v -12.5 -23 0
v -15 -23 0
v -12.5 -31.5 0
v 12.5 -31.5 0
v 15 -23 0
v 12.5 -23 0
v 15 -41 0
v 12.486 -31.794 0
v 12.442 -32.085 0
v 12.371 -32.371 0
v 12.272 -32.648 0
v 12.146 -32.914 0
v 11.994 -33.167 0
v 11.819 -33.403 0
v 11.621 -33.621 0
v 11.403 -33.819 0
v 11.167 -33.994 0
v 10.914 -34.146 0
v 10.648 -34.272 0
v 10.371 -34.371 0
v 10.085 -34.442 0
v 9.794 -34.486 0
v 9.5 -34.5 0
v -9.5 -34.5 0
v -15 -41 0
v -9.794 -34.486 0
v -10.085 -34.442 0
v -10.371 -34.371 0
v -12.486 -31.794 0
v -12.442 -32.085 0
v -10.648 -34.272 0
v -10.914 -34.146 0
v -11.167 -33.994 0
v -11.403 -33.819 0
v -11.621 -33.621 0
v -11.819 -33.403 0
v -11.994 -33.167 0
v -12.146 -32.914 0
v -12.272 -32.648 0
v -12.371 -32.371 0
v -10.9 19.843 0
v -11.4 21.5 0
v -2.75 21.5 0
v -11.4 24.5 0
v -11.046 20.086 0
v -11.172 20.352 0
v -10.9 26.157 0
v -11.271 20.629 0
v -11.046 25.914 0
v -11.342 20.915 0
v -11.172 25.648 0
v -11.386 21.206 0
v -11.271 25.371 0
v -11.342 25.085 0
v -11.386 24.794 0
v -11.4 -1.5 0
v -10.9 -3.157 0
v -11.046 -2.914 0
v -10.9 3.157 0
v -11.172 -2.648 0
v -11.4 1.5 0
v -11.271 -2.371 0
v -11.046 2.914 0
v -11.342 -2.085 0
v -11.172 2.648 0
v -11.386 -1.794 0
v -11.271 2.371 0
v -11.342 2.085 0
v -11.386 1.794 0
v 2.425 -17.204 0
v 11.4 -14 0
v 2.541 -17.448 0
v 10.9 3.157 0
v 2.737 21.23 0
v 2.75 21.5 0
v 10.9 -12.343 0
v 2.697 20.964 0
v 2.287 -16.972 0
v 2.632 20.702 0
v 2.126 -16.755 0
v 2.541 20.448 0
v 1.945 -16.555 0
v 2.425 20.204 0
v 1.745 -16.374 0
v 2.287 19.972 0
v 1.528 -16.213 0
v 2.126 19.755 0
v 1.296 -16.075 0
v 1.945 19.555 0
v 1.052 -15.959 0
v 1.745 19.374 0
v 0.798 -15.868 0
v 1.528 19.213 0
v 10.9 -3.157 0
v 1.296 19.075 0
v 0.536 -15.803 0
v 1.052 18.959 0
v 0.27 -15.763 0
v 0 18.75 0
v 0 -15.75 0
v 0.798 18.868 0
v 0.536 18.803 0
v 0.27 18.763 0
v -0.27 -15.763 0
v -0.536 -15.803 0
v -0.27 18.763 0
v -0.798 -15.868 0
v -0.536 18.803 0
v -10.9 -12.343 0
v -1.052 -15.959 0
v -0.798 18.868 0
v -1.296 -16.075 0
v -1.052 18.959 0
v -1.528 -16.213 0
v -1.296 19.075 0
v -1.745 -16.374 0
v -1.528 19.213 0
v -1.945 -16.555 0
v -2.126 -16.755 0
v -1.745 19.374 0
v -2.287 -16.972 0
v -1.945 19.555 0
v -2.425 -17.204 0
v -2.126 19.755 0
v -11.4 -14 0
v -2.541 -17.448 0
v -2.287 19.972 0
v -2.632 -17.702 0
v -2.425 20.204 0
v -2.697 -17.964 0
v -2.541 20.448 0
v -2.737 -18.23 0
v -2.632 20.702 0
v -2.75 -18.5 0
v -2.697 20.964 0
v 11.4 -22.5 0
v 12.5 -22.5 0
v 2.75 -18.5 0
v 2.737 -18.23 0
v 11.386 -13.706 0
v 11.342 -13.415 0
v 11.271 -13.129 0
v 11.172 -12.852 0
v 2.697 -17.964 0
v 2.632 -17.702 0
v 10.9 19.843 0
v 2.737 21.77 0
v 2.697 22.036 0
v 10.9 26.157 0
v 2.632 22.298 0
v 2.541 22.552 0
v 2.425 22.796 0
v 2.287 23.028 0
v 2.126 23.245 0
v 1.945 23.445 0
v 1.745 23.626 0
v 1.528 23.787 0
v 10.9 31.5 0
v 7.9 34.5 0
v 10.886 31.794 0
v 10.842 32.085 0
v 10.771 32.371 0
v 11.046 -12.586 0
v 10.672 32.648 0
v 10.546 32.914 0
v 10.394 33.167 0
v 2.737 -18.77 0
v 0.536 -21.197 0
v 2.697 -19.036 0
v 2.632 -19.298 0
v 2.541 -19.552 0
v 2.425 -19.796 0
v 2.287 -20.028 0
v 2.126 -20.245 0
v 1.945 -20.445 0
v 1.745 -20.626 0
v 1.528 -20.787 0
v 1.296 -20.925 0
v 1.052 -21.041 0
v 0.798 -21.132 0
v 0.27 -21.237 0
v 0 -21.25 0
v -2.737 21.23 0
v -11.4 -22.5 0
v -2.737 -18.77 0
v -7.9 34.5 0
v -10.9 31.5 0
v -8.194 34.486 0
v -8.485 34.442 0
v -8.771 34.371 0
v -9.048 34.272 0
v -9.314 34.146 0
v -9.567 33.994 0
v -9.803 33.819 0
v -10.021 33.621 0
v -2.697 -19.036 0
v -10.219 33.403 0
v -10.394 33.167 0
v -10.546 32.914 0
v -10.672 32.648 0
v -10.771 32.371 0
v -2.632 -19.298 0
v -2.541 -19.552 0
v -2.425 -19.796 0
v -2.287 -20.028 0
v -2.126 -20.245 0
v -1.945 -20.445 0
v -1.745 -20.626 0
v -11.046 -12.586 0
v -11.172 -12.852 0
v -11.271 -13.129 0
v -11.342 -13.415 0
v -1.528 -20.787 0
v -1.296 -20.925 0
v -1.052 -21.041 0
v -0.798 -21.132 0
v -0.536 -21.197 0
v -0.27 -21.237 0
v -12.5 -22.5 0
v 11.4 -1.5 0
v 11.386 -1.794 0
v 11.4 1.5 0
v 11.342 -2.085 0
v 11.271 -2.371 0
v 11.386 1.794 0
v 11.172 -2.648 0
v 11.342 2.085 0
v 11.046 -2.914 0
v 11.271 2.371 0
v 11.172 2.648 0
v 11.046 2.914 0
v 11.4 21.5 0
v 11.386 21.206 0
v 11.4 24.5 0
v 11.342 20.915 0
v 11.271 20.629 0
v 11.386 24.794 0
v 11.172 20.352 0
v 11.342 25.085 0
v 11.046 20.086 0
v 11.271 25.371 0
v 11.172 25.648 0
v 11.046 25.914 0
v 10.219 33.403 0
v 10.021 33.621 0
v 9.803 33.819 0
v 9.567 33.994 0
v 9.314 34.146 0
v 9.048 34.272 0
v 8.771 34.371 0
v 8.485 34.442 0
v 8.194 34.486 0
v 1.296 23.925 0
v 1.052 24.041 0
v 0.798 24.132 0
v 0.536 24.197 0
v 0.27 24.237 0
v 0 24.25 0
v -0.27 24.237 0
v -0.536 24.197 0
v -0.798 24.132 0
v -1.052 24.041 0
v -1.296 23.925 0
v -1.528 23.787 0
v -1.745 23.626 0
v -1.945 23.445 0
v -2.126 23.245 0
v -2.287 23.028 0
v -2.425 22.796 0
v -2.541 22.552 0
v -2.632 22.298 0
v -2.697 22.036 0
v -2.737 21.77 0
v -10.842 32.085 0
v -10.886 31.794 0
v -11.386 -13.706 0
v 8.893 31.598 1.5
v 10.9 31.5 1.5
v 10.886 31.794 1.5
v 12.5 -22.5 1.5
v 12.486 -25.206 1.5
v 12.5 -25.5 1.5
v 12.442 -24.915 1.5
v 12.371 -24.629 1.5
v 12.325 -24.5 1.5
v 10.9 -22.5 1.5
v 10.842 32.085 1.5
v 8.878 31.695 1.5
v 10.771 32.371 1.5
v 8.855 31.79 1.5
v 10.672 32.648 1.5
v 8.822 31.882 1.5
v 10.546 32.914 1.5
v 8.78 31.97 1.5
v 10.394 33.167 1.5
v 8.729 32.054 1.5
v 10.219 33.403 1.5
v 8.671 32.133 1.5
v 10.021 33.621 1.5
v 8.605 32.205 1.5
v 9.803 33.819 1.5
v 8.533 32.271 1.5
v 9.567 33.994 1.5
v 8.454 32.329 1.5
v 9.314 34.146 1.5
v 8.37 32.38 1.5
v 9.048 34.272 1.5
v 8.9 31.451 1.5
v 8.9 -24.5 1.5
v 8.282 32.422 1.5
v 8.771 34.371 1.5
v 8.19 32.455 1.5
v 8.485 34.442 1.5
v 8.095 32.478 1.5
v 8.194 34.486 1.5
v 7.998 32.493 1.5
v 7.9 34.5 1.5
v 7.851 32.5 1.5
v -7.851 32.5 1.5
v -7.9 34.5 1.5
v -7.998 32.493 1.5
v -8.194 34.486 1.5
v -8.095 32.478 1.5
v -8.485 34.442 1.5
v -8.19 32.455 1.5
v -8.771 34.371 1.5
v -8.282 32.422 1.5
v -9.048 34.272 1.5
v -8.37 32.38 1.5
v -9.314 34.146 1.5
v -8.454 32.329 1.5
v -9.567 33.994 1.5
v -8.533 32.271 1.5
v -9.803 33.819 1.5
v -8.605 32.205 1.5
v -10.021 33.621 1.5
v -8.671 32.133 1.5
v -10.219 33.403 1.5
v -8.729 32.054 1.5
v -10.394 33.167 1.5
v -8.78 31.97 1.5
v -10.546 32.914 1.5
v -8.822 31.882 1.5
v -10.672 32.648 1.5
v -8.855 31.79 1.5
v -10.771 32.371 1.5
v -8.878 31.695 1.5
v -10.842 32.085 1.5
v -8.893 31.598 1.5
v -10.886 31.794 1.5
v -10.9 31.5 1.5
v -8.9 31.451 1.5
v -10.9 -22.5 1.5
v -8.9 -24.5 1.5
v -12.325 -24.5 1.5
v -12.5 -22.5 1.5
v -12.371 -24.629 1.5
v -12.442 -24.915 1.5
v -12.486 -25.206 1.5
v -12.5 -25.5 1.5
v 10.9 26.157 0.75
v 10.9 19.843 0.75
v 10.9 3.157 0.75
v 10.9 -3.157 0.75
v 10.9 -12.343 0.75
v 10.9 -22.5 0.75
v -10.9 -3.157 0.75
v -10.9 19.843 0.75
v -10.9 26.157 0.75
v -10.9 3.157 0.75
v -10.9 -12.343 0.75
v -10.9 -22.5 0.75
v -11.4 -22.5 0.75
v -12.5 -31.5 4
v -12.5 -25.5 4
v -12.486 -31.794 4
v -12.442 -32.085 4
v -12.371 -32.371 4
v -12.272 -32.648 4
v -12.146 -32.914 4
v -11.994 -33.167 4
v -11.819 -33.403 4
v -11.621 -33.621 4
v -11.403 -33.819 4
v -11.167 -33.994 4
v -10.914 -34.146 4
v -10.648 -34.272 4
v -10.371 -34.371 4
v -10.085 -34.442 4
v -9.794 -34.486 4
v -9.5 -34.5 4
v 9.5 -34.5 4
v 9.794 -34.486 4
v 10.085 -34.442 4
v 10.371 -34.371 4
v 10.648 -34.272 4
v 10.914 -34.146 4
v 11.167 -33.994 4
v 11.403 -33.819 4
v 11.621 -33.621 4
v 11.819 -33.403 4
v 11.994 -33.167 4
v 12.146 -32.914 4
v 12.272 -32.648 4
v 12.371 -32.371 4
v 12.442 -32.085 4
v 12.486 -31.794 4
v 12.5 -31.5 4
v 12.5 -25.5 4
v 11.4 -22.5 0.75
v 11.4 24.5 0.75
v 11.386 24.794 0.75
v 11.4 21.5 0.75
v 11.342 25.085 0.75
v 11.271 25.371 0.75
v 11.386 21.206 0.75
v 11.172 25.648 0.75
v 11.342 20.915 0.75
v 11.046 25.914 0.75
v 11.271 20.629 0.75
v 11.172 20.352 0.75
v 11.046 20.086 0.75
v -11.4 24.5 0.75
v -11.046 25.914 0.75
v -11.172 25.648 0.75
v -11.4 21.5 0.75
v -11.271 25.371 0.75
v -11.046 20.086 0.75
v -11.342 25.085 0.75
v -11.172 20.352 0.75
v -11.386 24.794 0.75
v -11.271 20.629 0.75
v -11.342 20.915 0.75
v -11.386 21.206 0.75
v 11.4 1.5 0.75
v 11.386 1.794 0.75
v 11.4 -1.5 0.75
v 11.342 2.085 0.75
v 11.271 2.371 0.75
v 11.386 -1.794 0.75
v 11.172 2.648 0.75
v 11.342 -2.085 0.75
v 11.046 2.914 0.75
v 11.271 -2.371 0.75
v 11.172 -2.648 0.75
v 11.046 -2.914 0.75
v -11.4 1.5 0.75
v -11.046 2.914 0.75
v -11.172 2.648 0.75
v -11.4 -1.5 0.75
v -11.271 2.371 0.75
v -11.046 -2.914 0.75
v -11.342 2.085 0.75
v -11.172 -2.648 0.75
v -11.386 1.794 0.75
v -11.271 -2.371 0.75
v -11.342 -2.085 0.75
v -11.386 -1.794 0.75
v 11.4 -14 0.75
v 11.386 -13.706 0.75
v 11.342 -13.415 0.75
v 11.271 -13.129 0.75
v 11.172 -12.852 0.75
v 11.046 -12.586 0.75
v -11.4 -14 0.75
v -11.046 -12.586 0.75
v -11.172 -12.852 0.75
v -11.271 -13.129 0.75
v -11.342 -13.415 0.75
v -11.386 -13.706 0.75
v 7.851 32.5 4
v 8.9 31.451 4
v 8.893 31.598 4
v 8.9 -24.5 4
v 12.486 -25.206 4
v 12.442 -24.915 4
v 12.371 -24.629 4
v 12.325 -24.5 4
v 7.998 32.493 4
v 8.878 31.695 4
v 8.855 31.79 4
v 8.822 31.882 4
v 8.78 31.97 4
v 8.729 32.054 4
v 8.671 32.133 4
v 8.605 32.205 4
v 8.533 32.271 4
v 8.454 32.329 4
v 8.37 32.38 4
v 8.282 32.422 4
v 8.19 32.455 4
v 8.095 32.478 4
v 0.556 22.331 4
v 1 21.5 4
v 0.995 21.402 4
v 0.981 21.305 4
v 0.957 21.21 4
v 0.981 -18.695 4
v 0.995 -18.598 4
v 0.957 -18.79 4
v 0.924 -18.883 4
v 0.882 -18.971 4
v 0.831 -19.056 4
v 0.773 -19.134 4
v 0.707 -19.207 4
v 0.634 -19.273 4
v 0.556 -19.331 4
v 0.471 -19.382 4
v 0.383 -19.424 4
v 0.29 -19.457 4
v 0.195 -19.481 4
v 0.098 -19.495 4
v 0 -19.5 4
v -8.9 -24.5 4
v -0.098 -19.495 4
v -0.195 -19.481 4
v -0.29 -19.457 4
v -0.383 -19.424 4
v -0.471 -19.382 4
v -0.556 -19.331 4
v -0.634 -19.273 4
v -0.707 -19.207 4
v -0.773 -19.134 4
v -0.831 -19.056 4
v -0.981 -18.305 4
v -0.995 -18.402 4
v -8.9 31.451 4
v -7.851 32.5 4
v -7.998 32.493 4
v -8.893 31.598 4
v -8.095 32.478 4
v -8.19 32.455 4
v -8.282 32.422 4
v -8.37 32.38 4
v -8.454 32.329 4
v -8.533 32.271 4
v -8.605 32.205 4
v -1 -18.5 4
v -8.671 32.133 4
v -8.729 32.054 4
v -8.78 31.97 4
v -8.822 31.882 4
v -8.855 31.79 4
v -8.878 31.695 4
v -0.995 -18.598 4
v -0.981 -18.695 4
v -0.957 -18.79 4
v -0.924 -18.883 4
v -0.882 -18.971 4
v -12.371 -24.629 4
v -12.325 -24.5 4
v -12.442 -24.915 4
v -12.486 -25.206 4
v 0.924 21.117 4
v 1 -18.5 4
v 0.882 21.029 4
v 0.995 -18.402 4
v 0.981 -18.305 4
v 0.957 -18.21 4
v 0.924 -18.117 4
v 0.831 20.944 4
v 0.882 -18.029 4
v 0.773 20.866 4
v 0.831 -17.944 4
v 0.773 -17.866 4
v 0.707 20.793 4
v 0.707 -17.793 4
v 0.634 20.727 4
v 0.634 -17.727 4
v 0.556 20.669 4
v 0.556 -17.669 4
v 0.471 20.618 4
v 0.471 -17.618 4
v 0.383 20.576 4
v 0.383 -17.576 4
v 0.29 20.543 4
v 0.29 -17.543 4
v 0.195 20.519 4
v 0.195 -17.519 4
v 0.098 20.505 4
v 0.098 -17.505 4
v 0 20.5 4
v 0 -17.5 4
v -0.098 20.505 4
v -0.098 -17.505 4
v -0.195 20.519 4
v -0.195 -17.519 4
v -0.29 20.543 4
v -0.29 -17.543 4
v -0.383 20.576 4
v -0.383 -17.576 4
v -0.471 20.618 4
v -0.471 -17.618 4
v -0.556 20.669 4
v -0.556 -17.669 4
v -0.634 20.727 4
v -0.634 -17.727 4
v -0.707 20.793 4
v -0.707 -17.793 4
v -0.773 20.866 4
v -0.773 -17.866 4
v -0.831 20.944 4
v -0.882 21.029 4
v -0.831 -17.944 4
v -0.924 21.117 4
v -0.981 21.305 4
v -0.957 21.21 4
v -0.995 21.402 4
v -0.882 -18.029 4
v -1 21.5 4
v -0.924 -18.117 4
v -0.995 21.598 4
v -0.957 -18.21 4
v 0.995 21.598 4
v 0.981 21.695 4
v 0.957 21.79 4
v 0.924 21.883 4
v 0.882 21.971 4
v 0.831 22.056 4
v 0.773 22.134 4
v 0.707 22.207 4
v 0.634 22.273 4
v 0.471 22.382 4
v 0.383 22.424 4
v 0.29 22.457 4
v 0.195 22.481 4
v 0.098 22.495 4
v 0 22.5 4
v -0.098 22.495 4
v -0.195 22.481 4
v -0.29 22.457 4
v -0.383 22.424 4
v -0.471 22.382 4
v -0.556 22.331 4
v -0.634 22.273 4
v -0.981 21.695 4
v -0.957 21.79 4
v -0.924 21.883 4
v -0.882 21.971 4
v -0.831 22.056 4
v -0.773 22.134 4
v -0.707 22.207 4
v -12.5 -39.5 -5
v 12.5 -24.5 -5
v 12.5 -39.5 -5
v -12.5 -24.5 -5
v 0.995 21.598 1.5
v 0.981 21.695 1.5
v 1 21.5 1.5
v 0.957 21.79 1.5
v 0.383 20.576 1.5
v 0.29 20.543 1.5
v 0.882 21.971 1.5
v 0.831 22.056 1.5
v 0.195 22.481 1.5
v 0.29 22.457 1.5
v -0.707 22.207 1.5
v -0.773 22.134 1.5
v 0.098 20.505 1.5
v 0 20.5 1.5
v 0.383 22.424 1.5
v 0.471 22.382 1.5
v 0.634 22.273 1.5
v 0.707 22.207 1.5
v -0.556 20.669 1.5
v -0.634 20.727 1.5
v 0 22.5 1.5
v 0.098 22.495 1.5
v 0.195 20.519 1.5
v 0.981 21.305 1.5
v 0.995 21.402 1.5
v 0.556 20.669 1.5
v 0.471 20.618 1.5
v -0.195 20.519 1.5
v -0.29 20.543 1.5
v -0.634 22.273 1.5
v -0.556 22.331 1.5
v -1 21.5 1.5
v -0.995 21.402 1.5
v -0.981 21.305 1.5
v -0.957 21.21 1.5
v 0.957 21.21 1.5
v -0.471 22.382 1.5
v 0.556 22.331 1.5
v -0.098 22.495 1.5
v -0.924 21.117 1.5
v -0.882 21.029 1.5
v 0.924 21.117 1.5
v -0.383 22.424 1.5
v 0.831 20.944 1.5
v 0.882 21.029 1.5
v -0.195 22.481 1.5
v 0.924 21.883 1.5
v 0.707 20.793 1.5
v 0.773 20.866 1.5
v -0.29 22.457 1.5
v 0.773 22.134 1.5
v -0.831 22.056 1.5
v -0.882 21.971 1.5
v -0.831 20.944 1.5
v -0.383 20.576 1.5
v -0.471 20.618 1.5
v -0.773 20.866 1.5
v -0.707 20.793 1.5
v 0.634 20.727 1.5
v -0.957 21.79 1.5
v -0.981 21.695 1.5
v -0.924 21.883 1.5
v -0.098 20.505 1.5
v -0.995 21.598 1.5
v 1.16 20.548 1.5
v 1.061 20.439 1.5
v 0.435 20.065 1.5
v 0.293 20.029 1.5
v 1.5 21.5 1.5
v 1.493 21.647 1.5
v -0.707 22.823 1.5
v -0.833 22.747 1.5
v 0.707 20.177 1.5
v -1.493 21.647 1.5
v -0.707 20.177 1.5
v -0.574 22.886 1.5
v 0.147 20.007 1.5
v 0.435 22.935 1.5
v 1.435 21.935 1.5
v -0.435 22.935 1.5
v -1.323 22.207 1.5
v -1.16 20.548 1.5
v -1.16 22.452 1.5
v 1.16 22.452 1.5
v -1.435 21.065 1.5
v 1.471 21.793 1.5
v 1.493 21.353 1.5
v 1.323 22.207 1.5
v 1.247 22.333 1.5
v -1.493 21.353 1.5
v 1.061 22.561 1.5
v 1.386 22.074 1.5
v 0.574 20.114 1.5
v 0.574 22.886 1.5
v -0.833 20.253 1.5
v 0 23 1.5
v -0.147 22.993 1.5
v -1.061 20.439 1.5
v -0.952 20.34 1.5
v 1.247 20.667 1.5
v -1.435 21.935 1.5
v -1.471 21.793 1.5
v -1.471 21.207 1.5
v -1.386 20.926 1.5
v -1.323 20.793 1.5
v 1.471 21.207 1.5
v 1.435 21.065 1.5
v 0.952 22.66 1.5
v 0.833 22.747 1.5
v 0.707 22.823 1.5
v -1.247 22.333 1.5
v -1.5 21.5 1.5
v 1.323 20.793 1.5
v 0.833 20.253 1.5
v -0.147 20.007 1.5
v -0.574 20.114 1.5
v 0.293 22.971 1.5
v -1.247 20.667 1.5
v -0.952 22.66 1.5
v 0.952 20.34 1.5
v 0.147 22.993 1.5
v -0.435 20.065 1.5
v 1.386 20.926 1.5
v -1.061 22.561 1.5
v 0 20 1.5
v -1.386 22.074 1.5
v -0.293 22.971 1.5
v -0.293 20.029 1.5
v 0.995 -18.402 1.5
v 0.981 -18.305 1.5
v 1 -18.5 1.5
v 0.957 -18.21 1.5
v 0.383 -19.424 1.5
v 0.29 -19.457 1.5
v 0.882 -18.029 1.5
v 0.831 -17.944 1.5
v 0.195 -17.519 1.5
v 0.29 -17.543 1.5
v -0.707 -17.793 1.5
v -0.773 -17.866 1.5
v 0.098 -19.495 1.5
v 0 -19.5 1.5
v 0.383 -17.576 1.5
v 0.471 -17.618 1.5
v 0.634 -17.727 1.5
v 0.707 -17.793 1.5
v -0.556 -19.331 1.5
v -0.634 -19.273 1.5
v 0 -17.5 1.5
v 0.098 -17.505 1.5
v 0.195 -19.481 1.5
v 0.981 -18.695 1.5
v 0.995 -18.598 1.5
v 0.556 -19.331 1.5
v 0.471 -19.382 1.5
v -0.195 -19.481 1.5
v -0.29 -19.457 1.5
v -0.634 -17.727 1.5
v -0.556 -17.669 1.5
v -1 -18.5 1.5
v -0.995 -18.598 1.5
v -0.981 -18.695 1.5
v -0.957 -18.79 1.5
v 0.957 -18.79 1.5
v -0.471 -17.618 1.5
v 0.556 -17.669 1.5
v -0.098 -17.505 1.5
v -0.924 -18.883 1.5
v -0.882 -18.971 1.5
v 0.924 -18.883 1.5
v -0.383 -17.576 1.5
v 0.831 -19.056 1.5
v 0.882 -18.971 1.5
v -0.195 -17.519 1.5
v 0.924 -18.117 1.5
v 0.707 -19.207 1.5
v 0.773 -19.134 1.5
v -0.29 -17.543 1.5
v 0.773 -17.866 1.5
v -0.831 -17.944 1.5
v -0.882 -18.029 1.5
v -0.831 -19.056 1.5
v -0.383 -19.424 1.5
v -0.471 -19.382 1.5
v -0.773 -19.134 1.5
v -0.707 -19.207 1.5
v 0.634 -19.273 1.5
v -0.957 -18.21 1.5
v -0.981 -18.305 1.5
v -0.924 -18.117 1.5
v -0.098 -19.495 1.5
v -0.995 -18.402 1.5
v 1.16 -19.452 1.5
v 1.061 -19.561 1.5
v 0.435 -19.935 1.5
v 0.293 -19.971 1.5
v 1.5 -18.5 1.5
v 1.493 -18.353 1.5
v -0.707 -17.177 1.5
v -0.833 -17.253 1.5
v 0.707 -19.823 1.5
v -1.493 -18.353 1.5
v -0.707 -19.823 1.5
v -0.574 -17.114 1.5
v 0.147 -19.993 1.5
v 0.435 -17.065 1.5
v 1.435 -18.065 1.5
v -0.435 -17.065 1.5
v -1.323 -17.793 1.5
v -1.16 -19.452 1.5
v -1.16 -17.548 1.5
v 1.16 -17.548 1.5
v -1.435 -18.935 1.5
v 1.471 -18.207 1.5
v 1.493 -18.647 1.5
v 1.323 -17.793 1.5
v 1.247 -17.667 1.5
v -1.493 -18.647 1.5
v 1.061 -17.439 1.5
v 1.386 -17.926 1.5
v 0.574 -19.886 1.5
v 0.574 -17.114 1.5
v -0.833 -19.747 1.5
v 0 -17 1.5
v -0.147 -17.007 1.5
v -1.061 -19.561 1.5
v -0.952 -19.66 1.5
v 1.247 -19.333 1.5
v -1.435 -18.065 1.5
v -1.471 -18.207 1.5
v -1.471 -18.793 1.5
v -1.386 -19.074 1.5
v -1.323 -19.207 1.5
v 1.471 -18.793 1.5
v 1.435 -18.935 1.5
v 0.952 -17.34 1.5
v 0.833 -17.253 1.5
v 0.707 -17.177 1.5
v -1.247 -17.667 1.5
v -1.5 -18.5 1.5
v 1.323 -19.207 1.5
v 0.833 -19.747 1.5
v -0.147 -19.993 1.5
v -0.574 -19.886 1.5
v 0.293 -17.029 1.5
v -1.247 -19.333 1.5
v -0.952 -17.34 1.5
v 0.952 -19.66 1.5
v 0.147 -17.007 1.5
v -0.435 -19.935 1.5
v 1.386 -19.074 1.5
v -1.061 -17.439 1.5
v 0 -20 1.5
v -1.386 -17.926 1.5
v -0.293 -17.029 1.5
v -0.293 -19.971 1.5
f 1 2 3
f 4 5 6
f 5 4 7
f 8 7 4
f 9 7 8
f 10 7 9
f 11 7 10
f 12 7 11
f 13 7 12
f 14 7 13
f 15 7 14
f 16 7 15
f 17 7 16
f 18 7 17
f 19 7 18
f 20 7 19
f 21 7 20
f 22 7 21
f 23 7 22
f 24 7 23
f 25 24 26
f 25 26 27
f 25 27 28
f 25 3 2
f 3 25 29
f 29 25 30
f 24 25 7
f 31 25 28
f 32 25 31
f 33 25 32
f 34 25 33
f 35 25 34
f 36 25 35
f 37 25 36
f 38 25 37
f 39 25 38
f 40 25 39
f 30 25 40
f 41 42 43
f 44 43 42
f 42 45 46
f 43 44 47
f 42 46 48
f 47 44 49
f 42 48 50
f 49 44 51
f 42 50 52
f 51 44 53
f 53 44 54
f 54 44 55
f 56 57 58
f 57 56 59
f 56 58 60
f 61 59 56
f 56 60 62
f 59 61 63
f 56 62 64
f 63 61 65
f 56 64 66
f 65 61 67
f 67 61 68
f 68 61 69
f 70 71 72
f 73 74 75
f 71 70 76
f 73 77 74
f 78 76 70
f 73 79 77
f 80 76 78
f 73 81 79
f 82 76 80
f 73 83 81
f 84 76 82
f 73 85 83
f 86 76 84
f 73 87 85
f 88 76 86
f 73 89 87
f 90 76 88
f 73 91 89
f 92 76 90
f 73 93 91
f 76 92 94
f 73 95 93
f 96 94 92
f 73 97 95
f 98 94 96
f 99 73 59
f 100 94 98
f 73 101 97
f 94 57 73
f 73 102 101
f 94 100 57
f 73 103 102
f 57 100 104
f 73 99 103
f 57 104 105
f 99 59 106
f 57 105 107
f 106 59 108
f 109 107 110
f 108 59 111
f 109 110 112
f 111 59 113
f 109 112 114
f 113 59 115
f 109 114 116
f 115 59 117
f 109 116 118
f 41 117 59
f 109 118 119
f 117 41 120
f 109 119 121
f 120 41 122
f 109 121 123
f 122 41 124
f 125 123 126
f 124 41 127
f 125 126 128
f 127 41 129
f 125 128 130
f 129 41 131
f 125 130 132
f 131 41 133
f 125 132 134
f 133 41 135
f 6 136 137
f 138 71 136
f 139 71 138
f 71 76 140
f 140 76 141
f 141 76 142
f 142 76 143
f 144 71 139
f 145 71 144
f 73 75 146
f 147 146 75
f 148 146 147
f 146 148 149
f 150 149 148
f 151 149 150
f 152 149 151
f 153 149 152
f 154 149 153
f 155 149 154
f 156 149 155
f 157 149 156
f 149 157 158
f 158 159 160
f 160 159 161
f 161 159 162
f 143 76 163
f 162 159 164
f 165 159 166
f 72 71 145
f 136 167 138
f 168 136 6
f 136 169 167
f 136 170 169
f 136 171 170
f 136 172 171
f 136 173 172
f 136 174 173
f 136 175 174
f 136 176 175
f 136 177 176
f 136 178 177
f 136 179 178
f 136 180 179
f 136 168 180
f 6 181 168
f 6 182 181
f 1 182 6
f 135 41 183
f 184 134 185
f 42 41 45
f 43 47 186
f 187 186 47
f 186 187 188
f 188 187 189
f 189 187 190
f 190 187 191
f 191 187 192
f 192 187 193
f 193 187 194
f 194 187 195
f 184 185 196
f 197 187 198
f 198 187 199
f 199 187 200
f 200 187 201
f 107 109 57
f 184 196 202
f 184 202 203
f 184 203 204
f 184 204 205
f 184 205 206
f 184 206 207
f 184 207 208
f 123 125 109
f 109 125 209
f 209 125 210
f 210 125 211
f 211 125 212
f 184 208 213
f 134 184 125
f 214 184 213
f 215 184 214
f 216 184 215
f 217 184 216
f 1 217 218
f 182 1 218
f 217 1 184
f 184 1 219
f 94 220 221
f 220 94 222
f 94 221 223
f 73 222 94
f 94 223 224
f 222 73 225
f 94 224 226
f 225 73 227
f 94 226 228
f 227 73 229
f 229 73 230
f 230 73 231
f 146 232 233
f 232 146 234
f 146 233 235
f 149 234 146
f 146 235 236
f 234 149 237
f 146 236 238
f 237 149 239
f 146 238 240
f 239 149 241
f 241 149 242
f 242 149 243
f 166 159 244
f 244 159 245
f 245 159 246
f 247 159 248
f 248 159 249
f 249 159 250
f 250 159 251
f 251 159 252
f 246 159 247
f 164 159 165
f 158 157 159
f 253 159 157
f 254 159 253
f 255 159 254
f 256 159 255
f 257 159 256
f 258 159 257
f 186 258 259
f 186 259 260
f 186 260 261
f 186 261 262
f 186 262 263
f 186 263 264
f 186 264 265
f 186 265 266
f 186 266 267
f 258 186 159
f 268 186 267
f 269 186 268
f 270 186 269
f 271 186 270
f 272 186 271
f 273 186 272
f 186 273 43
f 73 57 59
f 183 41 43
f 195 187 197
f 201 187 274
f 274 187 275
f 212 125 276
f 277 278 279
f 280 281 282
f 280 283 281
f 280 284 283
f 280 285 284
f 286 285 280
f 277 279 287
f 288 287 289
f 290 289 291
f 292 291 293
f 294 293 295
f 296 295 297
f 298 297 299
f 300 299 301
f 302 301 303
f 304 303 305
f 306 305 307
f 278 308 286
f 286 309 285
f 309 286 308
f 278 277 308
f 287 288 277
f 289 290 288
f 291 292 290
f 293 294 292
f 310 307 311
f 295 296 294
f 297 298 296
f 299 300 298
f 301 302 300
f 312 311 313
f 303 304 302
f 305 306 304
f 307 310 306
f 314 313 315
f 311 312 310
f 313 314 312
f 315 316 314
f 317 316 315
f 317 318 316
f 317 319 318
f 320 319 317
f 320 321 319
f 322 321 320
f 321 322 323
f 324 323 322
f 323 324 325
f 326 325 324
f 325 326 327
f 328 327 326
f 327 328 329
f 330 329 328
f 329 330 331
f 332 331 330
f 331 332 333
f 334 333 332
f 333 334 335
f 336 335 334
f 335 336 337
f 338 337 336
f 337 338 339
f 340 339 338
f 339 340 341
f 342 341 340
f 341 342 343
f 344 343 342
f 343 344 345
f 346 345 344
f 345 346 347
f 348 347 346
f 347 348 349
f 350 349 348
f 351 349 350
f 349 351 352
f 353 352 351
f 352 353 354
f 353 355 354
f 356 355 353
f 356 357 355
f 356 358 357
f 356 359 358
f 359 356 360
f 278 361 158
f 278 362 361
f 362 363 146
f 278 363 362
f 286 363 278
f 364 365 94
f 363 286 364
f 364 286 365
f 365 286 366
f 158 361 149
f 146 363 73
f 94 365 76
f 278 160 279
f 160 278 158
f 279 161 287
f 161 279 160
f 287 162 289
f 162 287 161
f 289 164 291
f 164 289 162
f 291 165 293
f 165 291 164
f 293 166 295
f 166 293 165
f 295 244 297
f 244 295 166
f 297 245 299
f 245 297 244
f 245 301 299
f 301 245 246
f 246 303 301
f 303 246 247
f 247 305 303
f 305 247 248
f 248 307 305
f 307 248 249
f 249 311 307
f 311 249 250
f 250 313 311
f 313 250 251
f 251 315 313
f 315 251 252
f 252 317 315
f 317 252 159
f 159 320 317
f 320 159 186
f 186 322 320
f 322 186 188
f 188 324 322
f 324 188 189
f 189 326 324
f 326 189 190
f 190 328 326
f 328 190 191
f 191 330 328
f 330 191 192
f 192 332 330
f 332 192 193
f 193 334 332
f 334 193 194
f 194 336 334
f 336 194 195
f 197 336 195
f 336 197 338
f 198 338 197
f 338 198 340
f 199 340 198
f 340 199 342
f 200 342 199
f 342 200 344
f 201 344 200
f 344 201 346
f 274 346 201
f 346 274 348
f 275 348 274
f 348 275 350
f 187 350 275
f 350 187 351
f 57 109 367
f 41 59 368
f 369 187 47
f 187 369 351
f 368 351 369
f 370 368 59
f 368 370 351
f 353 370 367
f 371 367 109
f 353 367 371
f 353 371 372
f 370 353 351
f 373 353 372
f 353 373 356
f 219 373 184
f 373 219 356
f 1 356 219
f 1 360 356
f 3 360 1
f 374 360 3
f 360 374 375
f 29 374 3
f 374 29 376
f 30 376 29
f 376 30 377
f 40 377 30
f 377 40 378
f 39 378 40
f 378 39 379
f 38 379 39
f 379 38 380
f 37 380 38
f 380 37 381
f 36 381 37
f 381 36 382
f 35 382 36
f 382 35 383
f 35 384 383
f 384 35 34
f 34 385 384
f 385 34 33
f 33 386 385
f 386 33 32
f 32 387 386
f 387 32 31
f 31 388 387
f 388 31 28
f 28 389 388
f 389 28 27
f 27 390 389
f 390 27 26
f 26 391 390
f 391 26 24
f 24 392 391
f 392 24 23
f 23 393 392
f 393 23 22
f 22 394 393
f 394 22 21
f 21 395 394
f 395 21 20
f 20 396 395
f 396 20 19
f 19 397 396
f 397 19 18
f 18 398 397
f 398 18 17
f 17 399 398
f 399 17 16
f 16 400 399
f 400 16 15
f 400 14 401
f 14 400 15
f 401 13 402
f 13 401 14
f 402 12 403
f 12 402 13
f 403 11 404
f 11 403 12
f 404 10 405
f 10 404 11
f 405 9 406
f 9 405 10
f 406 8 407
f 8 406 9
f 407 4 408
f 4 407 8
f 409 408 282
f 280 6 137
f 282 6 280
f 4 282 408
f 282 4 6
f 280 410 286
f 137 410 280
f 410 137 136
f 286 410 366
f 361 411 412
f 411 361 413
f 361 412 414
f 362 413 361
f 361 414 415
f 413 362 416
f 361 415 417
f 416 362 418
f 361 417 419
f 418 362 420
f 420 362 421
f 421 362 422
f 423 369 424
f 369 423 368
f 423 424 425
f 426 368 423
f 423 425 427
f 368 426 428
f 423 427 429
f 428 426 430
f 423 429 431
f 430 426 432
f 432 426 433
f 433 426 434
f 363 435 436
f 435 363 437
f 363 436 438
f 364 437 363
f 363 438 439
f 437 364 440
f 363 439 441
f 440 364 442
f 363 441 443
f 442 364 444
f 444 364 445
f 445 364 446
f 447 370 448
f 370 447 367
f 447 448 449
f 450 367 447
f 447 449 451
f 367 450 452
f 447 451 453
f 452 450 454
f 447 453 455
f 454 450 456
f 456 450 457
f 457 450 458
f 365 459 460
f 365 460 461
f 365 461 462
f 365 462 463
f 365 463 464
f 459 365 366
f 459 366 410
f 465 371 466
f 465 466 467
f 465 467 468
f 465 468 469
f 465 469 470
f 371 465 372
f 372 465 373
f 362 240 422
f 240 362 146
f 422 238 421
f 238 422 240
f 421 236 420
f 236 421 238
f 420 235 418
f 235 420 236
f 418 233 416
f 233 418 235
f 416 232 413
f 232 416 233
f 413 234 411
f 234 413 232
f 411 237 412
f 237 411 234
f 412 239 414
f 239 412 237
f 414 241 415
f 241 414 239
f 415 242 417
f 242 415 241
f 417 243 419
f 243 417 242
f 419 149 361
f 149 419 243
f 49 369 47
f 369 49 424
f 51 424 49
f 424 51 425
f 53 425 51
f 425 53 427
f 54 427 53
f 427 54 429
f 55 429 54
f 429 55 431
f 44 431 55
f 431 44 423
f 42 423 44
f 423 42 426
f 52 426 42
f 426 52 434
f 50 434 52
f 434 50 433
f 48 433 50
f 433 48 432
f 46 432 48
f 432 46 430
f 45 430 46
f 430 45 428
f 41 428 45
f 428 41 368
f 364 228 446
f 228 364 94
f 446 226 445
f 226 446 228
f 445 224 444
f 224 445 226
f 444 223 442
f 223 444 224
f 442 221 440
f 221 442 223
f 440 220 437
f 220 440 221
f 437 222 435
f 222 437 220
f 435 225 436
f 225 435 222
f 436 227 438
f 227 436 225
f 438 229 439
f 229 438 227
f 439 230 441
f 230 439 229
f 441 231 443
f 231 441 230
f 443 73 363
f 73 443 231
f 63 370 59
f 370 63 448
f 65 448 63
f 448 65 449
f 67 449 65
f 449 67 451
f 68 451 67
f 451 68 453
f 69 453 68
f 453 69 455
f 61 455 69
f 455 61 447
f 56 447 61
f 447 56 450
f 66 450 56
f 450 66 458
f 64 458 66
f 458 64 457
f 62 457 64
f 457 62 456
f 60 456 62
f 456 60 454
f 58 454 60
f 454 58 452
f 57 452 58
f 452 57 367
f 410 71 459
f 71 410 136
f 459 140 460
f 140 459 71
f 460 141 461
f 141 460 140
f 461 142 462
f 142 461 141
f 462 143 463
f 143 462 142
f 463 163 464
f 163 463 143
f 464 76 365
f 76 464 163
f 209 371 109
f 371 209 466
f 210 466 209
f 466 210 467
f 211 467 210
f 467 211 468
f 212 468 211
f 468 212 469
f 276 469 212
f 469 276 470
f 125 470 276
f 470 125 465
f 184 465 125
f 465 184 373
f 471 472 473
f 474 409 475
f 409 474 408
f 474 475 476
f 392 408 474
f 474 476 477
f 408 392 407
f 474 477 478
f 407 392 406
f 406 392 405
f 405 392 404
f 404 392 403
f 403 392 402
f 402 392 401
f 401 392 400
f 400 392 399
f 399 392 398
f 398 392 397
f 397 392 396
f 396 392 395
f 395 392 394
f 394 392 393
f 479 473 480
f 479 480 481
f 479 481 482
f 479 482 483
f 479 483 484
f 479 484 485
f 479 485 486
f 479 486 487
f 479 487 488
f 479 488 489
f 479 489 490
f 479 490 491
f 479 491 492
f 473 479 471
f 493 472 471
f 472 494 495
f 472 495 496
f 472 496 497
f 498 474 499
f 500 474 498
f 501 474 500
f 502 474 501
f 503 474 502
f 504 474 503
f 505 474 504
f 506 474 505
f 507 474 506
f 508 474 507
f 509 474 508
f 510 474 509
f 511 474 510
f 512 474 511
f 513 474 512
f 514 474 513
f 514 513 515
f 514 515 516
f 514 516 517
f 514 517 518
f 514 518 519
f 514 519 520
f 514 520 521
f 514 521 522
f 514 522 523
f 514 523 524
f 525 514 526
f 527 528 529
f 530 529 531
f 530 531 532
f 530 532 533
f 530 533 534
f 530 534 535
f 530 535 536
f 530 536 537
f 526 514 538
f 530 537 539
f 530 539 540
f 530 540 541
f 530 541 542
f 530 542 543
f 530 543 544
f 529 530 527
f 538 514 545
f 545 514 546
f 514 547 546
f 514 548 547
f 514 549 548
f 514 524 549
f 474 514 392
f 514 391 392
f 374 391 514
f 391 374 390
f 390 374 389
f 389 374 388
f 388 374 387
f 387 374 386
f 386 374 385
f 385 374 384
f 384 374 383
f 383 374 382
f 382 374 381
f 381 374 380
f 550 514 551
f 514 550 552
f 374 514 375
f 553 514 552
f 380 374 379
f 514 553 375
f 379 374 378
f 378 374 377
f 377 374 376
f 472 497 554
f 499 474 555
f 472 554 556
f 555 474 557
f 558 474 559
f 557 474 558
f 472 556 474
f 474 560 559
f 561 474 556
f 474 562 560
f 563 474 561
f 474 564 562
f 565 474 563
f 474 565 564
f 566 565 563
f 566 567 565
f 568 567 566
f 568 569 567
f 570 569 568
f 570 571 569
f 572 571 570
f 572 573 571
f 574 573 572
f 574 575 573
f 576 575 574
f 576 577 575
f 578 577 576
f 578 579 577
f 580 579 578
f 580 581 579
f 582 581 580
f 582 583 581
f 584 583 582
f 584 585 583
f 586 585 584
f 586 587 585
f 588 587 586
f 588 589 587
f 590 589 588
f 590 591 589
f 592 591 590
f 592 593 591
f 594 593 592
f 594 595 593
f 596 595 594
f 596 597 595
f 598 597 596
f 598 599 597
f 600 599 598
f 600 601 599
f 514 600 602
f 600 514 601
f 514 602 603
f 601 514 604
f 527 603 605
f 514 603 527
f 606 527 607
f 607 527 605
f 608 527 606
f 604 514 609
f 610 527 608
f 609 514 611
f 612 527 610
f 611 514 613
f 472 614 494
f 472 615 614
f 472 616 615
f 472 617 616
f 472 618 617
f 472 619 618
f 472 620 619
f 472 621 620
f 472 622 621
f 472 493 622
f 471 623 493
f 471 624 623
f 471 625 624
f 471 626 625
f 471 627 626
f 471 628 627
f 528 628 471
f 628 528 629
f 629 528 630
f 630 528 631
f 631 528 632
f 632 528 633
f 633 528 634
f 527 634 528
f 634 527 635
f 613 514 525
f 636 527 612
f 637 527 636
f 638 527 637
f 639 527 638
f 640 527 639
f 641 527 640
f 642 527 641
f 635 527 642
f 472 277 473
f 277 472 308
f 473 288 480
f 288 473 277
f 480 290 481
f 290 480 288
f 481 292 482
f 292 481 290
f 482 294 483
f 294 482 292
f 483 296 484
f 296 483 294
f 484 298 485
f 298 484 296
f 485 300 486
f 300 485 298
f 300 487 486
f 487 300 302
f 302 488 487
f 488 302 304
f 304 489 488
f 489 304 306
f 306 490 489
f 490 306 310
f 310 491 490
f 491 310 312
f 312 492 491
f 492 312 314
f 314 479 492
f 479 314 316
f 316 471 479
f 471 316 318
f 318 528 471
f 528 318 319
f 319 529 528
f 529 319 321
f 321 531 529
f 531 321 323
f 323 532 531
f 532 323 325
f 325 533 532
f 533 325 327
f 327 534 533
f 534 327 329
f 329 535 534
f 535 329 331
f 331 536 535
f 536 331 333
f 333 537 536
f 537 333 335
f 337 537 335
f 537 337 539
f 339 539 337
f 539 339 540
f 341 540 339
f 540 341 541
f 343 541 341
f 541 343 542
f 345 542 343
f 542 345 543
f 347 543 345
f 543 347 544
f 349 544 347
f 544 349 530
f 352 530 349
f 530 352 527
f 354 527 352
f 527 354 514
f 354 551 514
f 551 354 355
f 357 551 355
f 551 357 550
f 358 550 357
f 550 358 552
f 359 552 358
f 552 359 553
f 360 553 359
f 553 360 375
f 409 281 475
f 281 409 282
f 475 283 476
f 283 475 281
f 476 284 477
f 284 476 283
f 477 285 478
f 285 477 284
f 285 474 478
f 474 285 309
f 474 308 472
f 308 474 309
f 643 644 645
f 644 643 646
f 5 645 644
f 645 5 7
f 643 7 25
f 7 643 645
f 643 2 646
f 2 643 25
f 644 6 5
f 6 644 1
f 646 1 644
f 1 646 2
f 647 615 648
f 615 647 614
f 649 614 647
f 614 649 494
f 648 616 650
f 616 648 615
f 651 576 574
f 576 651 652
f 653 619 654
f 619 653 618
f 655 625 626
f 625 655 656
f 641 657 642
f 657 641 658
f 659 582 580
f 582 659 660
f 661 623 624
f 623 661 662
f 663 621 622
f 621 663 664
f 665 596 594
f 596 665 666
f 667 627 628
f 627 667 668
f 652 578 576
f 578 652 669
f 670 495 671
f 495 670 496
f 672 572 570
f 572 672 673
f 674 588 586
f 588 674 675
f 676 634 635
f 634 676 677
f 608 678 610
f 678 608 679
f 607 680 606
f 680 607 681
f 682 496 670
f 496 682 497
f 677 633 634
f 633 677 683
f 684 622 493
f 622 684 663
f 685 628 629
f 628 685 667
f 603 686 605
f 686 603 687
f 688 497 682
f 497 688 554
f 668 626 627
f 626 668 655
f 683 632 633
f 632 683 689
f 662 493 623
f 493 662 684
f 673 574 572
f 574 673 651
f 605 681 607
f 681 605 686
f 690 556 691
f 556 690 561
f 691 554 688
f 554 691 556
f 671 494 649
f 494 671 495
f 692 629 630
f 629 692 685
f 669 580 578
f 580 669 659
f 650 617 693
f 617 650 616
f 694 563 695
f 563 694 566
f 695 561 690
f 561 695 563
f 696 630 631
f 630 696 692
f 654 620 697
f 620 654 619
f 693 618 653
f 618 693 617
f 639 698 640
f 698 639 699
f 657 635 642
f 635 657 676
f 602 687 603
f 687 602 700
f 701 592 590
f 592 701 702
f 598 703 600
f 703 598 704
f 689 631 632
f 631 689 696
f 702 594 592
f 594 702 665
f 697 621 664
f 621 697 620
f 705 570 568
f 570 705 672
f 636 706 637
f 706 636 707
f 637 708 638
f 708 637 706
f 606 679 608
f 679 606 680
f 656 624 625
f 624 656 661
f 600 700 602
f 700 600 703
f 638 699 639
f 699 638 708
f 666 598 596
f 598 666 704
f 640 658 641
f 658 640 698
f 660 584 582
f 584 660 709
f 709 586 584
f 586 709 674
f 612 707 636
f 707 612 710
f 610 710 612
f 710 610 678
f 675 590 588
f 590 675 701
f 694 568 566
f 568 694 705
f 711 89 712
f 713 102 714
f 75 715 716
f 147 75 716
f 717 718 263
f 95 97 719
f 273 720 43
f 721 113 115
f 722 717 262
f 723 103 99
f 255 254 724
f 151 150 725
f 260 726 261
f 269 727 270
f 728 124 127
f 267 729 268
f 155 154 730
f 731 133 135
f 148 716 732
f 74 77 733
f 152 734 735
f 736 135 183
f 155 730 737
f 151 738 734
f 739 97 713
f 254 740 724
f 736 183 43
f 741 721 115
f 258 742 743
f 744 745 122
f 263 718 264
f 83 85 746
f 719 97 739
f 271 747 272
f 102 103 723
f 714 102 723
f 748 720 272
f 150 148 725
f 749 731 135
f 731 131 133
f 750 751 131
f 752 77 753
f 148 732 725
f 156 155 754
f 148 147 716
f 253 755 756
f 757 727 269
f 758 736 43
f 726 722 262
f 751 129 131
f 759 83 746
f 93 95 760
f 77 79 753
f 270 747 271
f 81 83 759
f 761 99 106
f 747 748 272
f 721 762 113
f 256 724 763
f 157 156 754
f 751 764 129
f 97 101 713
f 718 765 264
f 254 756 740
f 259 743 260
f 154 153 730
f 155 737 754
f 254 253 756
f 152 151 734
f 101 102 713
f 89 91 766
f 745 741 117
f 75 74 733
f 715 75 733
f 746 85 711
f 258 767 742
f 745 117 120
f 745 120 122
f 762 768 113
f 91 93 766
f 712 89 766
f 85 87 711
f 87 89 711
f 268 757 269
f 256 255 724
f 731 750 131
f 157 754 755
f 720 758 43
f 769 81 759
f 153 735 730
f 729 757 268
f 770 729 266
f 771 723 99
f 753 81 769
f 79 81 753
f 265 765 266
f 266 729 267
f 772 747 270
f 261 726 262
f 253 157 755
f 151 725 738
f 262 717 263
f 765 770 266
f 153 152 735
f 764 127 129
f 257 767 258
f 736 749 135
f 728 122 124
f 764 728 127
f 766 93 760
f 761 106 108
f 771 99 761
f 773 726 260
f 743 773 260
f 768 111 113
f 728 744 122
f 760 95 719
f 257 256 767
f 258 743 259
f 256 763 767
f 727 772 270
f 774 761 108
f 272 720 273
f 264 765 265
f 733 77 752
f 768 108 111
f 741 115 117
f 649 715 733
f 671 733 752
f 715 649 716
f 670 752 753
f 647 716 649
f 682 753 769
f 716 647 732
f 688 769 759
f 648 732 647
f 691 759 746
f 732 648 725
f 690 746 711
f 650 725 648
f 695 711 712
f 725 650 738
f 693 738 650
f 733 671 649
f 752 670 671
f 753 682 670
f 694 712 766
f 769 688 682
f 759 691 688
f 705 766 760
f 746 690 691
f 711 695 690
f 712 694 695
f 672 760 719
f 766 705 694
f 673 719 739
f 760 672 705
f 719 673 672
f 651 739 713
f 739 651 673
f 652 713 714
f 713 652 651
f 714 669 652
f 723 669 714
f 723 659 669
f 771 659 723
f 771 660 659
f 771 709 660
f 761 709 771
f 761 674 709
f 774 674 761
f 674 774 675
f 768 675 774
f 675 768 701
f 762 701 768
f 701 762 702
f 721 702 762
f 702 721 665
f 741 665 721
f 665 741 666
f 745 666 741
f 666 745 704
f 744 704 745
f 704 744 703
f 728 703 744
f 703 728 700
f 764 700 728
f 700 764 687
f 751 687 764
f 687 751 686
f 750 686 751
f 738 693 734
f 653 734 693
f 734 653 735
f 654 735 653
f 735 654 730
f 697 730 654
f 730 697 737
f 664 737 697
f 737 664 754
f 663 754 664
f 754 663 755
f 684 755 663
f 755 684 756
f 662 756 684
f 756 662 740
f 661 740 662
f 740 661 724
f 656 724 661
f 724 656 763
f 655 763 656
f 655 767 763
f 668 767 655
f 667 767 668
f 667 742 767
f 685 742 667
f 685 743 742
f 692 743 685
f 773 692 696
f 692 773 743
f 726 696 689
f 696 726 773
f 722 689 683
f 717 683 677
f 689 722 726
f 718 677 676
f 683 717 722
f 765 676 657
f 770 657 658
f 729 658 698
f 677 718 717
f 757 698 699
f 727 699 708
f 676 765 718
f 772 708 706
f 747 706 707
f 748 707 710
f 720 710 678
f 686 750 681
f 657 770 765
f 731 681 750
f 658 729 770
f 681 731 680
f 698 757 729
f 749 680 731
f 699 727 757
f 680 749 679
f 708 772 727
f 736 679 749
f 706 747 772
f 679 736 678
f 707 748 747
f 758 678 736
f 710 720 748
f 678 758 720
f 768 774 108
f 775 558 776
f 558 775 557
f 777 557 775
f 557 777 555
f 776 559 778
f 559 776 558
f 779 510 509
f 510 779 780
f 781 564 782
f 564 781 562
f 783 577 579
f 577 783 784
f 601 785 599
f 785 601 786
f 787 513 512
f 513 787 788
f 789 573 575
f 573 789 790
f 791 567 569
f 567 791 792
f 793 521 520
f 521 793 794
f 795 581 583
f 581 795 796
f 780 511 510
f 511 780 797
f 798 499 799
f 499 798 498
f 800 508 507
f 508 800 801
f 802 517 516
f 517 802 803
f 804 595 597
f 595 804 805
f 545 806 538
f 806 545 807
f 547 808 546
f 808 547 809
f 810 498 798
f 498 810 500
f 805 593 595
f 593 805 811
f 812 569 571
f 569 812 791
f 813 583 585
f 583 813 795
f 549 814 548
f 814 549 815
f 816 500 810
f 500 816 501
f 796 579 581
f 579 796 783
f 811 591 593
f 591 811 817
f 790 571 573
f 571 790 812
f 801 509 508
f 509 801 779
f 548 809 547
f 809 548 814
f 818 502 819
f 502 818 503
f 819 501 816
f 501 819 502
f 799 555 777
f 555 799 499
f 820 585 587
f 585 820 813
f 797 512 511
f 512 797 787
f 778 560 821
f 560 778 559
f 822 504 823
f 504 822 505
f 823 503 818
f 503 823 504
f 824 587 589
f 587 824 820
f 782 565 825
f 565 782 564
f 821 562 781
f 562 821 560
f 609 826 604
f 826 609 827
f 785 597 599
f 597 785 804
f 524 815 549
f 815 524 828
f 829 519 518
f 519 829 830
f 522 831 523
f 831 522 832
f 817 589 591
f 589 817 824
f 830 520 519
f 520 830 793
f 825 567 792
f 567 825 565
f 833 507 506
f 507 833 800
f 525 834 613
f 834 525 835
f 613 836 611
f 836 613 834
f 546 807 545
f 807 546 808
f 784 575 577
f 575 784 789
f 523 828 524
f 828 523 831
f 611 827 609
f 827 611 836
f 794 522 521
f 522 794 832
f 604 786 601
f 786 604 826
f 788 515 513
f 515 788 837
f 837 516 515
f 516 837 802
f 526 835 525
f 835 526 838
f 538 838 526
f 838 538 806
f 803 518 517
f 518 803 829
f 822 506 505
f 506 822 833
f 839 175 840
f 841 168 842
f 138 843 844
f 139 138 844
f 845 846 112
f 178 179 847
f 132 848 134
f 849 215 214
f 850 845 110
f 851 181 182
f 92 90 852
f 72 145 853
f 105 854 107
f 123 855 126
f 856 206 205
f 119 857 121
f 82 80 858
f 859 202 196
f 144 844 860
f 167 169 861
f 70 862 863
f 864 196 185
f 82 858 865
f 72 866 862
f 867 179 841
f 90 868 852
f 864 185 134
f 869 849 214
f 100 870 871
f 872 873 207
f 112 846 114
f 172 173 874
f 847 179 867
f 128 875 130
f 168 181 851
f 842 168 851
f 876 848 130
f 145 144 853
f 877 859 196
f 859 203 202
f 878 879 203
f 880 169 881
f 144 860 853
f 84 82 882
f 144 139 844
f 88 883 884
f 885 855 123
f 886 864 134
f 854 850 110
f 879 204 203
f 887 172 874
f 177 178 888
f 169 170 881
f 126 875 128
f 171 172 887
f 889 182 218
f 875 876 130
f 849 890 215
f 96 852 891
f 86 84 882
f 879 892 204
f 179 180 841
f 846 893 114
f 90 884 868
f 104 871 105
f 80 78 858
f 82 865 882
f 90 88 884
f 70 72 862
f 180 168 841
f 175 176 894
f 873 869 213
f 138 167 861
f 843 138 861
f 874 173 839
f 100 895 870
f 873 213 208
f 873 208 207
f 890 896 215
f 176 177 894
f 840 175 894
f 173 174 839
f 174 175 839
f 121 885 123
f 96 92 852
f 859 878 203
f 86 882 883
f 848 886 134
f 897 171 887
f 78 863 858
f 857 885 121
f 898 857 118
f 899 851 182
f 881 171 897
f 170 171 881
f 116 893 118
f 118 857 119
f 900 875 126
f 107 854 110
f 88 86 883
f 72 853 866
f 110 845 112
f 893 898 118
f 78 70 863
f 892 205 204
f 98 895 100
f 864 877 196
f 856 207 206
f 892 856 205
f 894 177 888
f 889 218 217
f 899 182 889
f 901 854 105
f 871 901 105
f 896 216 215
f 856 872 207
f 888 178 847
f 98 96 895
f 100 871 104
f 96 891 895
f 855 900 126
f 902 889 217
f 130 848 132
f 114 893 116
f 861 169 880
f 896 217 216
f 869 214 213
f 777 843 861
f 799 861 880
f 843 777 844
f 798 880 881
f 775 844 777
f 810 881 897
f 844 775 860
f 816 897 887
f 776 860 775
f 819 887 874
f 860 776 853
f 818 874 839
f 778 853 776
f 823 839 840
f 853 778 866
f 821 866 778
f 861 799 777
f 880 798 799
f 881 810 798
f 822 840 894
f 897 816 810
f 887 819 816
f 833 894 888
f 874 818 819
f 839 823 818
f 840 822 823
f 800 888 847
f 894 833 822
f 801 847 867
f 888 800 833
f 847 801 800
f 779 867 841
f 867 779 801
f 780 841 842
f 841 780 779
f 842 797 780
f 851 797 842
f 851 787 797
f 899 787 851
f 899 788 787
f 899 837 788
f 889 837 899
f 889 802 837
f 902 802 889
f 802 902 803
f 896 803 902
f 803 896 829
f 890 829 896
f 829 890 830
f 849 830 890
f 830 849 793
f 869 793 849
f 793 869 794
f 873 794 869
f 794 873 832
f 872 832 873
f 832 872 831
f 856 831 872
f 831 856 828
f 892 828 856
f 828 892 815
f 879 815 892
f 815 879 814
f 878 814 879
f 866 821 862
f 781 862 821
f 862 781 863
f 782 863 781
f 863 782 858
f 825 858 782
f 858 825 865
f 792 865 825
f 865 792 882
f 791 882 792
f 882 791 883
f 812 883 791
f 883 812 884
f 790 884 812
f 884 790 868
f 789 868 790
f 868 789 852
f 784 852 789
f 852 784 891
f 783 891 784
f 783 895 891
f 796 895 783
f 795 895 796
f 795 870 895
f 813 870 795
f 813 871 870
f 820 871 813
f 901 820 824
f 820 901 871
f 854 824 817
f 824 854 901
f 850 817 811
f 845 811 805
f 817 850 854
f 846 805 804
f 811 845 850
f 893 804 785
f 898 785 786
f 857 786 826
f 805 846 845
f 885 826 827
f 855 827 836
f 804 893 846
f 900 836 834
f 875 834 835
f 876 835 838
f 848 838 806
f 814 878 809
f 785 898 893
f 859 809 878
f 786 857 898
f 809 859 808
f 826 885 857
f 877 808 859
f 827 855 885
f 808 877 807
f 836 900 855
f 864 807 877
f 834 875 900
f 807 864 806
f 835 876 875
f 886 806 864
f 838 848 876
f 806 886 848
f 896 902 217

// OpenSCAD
$fn = 64;

// Thickness of the plate
thickness = 1.5;

// Optional thicker back support
back_support_thickness   = 4;  // set to 0 to disable the extra support layer
back_support_offset      = -2;  // border offset applied around the main plate
back_support_wide_offset = 2;  // additional offset for the wider bottom section

// Overall plate dimensions
plate_height = 69.0;
plate_width  = 21.8;

// Dimensions of the wider bottom section
wide_width  = 25;
wide_height = 12;

// Small side tabs used as guides
// These expand the width by 0.5 mm on each side (22.8 mm total)
// at three locations along the height of the plate
tab_extension = 0.5;                    // how far each tab extends beyond the plate
tab_width  = plate_width + tab_extension * 2;
tab_heights = [9, 9, 16];                // heights for tabs corresponding to tab_positions
// y positions for the centre of each tab relative to the
// centre of the plate (positive is up)
tab_positions = [23, 0, -19];

// Radius for rounding outer corners
corner_radius = 3;

// Screw hole measurements
hole_spacing = 40;        // distance between hole centres
hole_d      = 3;          // diameter of screw shaft
csk_d       = 5.5;        // diameter of countersunk head
csk_depth   = 1;          // depth of countersink

// Distance from top edge to centre of first screw hole
// (used to place both holes)
top_to_first_hole = 13;

module wide_section2d() {
    translate([0, -plate_height/2 + wide_height/2 ])
        square([wide_width, wide_height], center=true);
}

module backplate2d() {
    union() {
        // main rectangle
        square([plate_width, plate_height], center=true);
        // wider bottom section
        wide_section2d();
    }
}

module tabs2d() {
    for (i = [0:len(tab_positions)-1])
        translate([0, tab_positions[i]])
            square([tab_width, tab_heights[i]], center=true);
}

// Apply rounding to the outer corners of the main plate
// except for the top-left and bottom-right corners which remain square
module rounded_backplate2d() {
    union() {
        offset(r = corner_radius)
            offset(delta = -corner_radius)
                backplate2d();

        // Restore square corner at inside corner of the wide section
        translate([wide_width/2 - corner_radius, (-plate_height/2) + (wide_height-corner_radius)])
            square([corner_radius, corner_radius]);
        translate([-wide_width/2, (-plate_height/2) + (wide_height-corner_radius)])
            square([corner_radius, corner_radius]);

    }
}

// Rounded profiles for tabs
module rounded_tabs2d() {
    offset(r = corner_radius)
        offset(delta = -corner_radius)
            tabs2d();
}

module tapered_hole() {
    // Tapered opening for countersunk screw heads
    cylinder(h = (thickness+back_support_thickness), csk_d, center=false);
    cylinder(h = (thickness), d1 = csk_d, d2 = hole_d, center=false);
}

// Optional thicker back support with configurable offsets
module back_support2d() {
    union() {
        offset(delta = back_support_offset) rounded_backplate2d();

        difference() {
            translate([0, -plate_height/2 + wide_height/2])
                offset(r = corner_radius)
                    offset(delta = -corner_radius)
                        offset(delta = back_support_offset + back_support_wide_offset)
                            square([wide_width, wide_height], center=true);

            translate([0, -plate_height/2 + wide_height/2])
                offset(r = corner_radius)
                    offset(delta = -corner_radius)
                        offset(delta = back_support_offset)
                            square([wide_width, wide_height], center=true);

            // Remove the top portion so edge 3 matches the main plate
            translate([-(wide_width/2 + back_support_offset + back_support_wide_offset), -plate_height/2 + wide_height + back_support_offset])
                square([wide_width + 2*(back_support_offset + back_support_wide_offset), back_support_wide_offset], center=false);
        }
    }
}

// Create a solid base at the bottom of the backplate. The base tapers
// outwards as it extends away from the plate to give a stronger bond,
// inspired by the support shape in image 2.
//  base_height : dimension of the base along the Y axis
//  base_width  : dimension along the X axis
//  base_depth  : how far the base extends from the backplate (Z axis)
//  base_taper  : scaling factor applied to the bottom of the base
module solid_base(base_height=0, base_width=25, base_depth=5, base_taper=1.2)
{
    base_y = -plate_height/2 - base_height/2 + wide_height - 2;

    // Extrude the base downward and scale it to create the taper
    translate([0, base_y, -base_depth])
        linear_extrude(height = base_depth,
                       scale   = [base_taper, base_taper])
            offset(delta = back_support_offset + back_support_wide_offset)
                square([base_width, base_height], center=true);
}

// Create the 3D plate and remove the countersunk screw holes
// solid_base_height : height of the optional tapered base
// solid_base_depth  : how far the base extends from the plate
// solid_base_taper  : scaling factor for the base's bottom
module backplate(solid_base_height=15, solid_base_depth=5, solid_base_taper=1.2) {
    difference() {
        union() {
            linear_extrude(thickness) rounded_backplate2d();
            linear_extrude(thickness/2) rounded_tabs2d();
            if (back_support_thickness > 0)
                linear_extrude(back_support_thickness) back_support2d();
            solid_base(base_height = solid_base_height,
                       base_depth  = solid_base_depth,
                       base_taper  = solid_base_taper);
        }
        for (i = [0:1]) {
            translate([0, plate_height/2 - top_to_first_hole - i*hole_spacing, 0])
                tapered_hole();
        }
    }
}

// Render the backplate
backplate(15);
